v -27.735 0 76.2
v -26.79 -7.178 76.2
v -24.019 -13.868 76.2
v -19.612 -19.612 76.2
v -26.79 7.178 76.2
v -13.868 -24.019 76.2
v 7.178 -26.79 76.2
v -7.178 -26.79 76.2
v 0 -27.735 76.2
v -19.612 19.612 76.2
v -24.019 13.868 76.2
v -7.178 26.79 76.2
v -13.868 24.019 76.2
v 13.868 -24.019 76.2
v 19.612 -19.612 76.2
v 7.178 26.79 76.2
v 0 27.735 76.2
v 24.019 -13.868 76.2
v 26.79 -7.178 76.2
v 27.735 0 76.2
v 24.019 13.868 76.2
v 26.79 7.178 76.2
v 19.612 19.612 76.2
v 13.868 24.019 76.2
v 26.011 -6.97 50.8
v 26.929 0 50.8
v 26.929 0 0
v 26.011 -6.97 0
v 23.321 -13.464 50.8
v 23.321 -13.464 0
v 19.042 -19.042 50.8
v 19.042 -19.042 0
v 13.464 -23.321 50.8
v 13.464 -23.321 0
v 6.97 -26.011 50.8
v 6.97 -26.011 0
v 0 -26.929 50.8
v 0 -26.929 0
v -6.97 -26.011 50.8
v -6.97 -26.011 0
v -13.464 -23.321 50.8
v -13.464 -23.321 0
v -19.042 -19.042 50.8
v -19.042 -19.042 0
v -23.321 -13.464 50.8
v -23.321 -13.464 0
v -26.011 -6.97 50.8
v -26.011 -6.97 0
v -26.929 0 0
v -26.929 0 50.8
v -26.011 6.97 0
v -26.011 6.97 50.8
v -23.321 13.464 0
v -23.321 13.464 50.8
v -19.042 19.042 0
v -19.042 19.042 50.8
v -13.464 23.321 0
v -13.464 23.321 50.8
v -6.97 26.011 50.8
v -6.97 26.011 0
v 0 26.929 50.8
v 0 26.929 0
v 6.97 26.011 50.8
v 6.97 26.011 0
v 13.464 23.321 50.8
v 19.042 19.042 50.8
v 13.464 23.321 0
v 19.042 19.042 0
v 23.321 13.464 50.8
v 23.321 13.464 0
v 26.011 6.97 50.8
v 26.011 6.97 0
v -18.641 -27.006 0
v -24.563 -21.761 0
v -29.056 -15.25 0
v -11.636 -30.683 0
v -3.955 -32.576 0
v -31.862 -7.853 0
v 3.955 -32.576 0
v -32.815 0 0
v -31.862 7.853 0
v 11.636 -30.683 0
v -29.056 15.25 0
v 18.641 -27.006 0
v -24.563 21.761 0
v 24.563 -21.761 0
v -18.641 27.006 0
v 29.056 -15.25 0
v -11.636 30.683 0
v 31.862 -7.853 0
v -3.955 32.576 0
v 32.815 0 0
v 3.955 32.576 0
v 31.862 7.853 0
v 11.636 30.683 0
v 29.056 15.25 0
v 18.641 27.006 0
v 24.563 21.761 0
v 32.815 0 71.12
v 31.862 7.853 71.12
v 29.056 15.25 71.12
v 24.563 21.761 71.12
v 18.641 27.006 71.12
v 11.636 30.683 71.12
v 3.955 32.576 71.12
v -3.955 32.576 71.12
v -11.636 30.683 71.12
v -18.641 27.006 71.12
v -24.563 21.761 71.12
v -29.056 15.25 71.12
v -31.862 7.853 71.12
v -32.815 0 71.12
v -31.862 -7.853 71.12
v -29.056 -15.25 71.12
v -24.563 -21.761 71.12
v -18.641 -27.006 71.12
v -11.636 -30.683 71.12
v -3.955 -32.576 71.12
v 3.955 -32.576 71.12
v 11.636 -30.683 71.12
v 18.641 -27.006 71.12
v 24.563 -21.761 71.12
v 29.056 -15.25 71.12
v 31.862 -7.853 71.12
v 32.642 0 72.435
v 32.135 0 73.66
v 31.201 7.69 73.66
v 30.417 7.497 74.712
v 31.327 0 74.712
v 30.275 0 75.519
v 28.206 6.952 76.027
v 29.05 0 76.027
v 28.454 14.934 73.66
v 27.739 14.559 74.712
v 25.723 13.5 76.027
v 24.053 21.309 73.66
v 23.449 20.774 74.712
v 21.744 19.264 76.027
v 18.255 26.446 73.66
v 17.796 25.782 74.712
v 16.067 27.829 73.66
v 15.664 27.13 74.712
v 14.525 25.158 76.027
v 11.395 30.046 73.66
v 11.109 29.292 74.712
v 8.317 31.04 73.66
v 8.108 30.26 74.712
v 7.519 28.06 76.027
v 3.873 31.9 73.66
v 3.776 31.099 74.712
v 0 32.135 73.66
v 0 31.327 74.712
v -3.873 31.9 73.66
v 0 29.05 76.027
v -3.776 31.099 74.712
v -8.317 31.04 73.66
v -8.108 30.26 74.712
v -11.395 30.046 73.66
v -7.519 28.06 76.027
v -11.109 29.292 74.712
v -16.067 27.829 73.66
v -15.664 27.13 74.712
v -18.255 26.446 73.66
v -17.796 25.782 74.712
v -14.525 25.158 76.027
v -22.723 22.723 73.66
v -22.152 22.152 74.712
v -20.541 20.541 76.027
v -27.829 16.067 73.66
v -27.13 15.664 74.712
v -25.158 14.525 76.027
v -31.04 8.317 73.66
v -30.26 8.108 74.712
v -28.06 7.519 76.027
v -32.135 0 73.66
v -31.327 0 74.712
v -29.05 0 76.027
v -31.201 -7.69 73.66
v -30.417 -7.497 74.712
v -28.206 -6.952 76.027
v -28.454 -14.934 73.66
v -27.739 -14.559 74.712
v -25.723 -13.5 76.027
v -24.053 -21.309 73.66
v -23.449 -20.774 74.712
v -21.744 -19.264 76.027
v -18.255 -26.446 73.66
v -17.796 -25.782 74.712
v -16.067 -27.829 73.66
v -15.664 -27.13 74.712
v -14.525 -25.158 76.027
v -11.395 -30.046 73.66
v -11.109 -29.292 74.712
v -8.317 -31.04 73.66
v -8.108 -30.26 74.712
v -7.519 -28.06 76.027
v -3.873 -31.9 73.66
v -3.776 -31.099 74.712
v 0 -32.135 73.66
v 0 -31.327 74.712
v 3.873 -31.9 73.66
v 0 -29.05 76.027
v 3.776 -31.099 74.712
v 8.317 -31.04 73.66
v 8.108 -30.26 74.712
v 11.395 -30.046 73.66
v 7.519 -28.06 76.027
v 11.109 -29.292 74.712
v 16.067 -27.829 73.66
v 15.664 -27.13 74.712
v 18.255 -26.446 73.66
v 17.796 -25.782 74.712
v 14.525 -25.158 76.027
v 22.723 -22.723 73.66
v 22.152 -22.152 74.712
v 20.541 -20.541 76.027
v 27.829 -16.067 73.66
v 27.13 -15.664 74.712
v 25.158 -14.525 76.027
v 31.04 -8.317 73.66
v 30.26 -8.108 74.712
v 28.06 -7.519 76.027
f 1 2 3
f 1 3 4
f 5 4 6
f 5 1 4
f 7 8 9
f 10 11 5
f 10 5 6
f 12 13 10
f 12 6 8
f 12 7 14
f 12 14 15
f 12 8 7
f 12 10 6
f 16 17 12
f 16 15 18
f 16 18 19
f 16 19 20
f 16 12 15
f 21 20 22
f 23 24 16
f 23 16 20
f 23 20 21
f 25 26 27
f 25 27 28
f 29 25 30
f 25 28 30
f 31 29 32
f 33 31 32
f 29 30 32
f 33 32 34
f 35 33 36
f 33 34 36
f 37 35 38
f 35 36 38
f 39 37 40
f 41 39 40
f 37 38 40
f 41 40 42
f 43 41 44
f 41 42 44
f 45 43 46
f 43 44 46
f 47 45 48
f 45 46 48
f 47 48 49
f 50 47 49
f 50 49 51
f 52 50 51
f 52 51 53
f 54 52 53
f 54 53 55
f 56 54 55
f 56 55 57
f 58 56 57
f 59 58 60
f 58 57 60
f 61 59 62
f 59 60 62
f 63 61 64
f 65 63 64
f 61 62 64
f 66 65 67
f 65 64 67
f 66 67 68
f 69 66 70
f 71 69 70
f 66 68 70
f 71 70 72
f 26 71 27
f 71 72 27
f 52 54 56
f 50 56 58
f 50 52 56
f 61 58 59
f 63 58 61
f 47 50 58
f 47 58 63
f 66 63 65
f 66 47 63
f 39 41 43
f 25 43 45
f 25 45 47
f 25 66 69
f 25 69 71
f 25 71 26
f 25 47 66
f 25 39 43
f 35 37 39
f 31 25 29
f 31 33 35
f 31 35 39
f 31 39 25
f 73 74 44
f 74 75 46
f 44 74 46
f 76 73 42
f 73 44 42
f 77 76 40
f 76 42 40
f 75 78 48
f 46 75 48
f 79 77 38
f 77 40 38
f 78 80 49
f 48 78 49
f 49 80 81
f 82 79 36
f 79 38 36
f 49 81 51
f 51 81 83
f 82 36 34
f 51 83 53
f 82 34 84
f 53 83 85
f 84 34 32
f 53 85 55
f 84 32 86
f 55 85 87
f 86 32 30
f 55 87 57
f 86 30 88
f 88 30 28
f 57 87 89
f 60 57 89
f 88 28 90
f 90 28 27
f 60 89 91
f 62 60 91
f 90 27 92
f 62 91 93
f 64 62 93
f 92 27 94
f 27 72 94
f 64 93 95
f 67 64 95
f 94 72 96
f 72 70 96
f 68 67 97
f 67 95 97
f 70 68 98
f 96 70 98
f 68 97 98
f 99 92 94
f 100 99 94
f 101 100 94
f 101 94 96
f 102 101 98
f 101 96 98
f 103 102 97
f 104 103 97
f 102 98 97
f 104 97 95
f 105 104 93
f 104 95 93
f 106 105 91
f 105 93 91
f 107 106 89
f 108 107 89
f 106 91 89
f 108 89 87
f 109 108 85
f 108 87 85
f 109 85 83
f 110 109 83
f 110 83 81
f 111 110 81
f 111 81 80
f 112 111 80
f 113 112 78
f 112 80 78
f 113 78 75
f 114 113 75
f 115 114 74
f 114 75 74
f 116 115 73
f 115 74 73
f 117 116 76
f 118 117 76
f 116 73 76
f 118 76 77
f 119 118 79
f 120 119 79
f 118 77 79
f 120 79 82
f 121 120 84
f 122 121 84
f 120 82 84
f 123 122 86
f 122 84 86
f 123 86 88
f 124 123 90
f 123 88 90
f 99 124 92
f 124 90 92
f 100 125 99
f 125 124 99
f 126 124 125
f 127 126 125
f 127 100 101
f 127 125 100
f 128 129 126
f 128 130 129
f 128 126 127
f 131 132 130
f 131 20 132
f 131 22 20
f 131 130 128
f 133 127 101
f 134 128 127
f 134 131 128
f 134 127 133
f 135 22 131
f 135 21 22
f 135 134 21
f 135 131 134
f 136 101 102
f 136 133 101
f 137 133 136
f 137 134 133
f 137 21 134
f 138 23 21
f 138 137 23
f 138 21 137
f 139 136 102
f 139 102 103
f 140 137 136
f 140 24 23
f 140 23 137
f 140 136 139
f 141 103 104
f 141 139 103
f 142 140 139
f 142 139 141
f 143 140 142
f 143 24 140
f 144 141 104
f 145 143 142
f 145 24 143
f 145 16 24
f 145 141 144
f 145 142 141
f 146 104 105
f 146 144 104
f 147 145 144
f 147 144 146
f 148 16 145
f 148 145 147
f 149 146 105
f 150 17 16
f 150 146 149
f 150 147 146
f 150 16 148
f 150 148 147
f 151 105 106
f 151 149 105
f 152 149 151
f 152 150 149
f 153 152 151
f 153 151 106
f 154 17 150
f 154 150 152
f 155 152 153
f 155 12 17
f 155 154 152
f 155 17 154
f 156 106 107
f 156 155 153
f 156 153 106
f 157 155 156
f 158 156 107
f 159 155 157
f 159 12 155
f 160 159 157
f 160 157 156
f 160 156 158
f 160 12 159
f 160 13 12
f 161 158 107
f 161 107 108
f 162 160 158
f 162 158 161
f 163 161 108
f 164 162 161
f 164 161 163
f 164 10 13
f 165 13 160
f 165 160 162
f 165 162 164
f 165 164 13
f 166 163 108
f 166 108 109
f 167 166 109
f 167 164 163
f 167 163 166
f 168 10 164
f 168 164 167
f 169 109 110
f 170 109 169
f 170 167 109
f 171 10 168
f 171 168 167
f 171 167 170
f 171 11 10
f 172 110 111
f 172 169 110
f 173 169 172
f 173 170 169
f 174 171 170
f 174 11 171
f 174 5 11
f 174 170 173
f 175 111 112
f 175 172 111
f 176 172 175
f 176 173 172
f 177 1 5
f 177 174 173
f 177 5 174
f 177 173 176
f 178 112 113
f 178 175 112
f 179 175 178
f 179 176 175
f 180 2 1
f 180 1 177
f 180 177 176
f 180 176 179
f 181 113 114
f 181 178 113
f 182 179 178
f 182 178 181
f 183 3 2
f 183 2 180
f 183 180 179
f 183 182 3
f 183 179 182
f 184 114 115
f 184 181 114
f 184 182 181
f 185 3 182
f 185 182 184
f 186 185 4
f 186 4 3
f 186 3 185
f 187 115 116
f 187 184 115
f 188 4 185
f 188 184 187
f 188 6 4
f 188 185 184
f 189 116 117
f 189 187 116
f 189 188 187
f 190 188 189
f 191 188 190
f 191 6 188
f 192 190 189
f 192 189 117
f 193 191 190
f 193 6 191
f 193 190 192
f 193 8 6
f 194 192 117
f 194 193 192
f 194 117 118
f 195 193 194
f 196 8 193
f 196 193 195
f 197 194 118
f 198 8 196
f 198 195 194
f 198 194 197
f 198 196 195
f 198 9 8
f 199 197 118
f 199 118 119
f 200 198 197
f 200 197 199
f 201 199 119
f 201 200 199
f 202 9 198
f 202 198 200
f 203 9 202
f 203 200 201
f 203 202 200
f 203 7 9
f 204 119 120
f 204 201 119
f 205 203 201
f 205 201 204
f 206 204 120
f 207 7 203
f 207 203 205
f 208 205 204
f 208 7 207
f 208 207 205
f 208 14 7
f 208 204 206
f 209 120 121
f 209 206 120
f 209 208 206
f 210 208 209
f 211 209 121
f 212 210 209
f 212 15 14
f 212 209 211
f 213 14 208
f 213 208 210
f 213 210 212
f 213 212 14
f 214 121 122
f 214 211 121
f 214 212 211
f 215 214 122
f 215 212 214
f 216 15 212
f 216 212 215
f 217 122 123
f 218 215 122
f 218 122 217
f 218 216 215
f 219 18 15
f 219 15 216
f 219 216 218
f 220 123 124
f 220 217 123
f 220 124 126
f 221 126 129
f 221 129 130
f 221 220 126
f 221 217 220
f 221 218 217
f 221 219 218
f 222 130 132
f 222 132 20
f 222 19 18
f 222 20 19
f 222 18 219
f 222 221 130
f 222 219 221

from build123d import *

# Parameters (mm, degrees)
F0_R     = 32.815242
F1_DEPTH = 76.2
F2_R     = 5.08
F3_R     = 26.928884
F4_DEPTH = 50.8


with BuildPart() as f1:
    # F0 (on Top) → F1 (new body)
    with BuildSketch(Plane.XY):
        Circle(F0_R)
    extrude(amount=F1_DEPTH)

    # F2
    f2_edges = [f1.edges().sort_by_distance(p)[0] for p in [
        (-32.815242, 0, 76.2),
    ]]
    fillet(f2_edges, radius=F2_R)

    # F3 (on face) → F4 (cut)
    with BuildSketch(Plane(origin=(0, 0, 0), x_dir=(1, 0, 0), z_dir=(0, 0, -1))):
        Circle(F3_R)
    extrude(amount=-F4_DEPTH, mode=Mode.SUBTRACT)


solid = f1.part
